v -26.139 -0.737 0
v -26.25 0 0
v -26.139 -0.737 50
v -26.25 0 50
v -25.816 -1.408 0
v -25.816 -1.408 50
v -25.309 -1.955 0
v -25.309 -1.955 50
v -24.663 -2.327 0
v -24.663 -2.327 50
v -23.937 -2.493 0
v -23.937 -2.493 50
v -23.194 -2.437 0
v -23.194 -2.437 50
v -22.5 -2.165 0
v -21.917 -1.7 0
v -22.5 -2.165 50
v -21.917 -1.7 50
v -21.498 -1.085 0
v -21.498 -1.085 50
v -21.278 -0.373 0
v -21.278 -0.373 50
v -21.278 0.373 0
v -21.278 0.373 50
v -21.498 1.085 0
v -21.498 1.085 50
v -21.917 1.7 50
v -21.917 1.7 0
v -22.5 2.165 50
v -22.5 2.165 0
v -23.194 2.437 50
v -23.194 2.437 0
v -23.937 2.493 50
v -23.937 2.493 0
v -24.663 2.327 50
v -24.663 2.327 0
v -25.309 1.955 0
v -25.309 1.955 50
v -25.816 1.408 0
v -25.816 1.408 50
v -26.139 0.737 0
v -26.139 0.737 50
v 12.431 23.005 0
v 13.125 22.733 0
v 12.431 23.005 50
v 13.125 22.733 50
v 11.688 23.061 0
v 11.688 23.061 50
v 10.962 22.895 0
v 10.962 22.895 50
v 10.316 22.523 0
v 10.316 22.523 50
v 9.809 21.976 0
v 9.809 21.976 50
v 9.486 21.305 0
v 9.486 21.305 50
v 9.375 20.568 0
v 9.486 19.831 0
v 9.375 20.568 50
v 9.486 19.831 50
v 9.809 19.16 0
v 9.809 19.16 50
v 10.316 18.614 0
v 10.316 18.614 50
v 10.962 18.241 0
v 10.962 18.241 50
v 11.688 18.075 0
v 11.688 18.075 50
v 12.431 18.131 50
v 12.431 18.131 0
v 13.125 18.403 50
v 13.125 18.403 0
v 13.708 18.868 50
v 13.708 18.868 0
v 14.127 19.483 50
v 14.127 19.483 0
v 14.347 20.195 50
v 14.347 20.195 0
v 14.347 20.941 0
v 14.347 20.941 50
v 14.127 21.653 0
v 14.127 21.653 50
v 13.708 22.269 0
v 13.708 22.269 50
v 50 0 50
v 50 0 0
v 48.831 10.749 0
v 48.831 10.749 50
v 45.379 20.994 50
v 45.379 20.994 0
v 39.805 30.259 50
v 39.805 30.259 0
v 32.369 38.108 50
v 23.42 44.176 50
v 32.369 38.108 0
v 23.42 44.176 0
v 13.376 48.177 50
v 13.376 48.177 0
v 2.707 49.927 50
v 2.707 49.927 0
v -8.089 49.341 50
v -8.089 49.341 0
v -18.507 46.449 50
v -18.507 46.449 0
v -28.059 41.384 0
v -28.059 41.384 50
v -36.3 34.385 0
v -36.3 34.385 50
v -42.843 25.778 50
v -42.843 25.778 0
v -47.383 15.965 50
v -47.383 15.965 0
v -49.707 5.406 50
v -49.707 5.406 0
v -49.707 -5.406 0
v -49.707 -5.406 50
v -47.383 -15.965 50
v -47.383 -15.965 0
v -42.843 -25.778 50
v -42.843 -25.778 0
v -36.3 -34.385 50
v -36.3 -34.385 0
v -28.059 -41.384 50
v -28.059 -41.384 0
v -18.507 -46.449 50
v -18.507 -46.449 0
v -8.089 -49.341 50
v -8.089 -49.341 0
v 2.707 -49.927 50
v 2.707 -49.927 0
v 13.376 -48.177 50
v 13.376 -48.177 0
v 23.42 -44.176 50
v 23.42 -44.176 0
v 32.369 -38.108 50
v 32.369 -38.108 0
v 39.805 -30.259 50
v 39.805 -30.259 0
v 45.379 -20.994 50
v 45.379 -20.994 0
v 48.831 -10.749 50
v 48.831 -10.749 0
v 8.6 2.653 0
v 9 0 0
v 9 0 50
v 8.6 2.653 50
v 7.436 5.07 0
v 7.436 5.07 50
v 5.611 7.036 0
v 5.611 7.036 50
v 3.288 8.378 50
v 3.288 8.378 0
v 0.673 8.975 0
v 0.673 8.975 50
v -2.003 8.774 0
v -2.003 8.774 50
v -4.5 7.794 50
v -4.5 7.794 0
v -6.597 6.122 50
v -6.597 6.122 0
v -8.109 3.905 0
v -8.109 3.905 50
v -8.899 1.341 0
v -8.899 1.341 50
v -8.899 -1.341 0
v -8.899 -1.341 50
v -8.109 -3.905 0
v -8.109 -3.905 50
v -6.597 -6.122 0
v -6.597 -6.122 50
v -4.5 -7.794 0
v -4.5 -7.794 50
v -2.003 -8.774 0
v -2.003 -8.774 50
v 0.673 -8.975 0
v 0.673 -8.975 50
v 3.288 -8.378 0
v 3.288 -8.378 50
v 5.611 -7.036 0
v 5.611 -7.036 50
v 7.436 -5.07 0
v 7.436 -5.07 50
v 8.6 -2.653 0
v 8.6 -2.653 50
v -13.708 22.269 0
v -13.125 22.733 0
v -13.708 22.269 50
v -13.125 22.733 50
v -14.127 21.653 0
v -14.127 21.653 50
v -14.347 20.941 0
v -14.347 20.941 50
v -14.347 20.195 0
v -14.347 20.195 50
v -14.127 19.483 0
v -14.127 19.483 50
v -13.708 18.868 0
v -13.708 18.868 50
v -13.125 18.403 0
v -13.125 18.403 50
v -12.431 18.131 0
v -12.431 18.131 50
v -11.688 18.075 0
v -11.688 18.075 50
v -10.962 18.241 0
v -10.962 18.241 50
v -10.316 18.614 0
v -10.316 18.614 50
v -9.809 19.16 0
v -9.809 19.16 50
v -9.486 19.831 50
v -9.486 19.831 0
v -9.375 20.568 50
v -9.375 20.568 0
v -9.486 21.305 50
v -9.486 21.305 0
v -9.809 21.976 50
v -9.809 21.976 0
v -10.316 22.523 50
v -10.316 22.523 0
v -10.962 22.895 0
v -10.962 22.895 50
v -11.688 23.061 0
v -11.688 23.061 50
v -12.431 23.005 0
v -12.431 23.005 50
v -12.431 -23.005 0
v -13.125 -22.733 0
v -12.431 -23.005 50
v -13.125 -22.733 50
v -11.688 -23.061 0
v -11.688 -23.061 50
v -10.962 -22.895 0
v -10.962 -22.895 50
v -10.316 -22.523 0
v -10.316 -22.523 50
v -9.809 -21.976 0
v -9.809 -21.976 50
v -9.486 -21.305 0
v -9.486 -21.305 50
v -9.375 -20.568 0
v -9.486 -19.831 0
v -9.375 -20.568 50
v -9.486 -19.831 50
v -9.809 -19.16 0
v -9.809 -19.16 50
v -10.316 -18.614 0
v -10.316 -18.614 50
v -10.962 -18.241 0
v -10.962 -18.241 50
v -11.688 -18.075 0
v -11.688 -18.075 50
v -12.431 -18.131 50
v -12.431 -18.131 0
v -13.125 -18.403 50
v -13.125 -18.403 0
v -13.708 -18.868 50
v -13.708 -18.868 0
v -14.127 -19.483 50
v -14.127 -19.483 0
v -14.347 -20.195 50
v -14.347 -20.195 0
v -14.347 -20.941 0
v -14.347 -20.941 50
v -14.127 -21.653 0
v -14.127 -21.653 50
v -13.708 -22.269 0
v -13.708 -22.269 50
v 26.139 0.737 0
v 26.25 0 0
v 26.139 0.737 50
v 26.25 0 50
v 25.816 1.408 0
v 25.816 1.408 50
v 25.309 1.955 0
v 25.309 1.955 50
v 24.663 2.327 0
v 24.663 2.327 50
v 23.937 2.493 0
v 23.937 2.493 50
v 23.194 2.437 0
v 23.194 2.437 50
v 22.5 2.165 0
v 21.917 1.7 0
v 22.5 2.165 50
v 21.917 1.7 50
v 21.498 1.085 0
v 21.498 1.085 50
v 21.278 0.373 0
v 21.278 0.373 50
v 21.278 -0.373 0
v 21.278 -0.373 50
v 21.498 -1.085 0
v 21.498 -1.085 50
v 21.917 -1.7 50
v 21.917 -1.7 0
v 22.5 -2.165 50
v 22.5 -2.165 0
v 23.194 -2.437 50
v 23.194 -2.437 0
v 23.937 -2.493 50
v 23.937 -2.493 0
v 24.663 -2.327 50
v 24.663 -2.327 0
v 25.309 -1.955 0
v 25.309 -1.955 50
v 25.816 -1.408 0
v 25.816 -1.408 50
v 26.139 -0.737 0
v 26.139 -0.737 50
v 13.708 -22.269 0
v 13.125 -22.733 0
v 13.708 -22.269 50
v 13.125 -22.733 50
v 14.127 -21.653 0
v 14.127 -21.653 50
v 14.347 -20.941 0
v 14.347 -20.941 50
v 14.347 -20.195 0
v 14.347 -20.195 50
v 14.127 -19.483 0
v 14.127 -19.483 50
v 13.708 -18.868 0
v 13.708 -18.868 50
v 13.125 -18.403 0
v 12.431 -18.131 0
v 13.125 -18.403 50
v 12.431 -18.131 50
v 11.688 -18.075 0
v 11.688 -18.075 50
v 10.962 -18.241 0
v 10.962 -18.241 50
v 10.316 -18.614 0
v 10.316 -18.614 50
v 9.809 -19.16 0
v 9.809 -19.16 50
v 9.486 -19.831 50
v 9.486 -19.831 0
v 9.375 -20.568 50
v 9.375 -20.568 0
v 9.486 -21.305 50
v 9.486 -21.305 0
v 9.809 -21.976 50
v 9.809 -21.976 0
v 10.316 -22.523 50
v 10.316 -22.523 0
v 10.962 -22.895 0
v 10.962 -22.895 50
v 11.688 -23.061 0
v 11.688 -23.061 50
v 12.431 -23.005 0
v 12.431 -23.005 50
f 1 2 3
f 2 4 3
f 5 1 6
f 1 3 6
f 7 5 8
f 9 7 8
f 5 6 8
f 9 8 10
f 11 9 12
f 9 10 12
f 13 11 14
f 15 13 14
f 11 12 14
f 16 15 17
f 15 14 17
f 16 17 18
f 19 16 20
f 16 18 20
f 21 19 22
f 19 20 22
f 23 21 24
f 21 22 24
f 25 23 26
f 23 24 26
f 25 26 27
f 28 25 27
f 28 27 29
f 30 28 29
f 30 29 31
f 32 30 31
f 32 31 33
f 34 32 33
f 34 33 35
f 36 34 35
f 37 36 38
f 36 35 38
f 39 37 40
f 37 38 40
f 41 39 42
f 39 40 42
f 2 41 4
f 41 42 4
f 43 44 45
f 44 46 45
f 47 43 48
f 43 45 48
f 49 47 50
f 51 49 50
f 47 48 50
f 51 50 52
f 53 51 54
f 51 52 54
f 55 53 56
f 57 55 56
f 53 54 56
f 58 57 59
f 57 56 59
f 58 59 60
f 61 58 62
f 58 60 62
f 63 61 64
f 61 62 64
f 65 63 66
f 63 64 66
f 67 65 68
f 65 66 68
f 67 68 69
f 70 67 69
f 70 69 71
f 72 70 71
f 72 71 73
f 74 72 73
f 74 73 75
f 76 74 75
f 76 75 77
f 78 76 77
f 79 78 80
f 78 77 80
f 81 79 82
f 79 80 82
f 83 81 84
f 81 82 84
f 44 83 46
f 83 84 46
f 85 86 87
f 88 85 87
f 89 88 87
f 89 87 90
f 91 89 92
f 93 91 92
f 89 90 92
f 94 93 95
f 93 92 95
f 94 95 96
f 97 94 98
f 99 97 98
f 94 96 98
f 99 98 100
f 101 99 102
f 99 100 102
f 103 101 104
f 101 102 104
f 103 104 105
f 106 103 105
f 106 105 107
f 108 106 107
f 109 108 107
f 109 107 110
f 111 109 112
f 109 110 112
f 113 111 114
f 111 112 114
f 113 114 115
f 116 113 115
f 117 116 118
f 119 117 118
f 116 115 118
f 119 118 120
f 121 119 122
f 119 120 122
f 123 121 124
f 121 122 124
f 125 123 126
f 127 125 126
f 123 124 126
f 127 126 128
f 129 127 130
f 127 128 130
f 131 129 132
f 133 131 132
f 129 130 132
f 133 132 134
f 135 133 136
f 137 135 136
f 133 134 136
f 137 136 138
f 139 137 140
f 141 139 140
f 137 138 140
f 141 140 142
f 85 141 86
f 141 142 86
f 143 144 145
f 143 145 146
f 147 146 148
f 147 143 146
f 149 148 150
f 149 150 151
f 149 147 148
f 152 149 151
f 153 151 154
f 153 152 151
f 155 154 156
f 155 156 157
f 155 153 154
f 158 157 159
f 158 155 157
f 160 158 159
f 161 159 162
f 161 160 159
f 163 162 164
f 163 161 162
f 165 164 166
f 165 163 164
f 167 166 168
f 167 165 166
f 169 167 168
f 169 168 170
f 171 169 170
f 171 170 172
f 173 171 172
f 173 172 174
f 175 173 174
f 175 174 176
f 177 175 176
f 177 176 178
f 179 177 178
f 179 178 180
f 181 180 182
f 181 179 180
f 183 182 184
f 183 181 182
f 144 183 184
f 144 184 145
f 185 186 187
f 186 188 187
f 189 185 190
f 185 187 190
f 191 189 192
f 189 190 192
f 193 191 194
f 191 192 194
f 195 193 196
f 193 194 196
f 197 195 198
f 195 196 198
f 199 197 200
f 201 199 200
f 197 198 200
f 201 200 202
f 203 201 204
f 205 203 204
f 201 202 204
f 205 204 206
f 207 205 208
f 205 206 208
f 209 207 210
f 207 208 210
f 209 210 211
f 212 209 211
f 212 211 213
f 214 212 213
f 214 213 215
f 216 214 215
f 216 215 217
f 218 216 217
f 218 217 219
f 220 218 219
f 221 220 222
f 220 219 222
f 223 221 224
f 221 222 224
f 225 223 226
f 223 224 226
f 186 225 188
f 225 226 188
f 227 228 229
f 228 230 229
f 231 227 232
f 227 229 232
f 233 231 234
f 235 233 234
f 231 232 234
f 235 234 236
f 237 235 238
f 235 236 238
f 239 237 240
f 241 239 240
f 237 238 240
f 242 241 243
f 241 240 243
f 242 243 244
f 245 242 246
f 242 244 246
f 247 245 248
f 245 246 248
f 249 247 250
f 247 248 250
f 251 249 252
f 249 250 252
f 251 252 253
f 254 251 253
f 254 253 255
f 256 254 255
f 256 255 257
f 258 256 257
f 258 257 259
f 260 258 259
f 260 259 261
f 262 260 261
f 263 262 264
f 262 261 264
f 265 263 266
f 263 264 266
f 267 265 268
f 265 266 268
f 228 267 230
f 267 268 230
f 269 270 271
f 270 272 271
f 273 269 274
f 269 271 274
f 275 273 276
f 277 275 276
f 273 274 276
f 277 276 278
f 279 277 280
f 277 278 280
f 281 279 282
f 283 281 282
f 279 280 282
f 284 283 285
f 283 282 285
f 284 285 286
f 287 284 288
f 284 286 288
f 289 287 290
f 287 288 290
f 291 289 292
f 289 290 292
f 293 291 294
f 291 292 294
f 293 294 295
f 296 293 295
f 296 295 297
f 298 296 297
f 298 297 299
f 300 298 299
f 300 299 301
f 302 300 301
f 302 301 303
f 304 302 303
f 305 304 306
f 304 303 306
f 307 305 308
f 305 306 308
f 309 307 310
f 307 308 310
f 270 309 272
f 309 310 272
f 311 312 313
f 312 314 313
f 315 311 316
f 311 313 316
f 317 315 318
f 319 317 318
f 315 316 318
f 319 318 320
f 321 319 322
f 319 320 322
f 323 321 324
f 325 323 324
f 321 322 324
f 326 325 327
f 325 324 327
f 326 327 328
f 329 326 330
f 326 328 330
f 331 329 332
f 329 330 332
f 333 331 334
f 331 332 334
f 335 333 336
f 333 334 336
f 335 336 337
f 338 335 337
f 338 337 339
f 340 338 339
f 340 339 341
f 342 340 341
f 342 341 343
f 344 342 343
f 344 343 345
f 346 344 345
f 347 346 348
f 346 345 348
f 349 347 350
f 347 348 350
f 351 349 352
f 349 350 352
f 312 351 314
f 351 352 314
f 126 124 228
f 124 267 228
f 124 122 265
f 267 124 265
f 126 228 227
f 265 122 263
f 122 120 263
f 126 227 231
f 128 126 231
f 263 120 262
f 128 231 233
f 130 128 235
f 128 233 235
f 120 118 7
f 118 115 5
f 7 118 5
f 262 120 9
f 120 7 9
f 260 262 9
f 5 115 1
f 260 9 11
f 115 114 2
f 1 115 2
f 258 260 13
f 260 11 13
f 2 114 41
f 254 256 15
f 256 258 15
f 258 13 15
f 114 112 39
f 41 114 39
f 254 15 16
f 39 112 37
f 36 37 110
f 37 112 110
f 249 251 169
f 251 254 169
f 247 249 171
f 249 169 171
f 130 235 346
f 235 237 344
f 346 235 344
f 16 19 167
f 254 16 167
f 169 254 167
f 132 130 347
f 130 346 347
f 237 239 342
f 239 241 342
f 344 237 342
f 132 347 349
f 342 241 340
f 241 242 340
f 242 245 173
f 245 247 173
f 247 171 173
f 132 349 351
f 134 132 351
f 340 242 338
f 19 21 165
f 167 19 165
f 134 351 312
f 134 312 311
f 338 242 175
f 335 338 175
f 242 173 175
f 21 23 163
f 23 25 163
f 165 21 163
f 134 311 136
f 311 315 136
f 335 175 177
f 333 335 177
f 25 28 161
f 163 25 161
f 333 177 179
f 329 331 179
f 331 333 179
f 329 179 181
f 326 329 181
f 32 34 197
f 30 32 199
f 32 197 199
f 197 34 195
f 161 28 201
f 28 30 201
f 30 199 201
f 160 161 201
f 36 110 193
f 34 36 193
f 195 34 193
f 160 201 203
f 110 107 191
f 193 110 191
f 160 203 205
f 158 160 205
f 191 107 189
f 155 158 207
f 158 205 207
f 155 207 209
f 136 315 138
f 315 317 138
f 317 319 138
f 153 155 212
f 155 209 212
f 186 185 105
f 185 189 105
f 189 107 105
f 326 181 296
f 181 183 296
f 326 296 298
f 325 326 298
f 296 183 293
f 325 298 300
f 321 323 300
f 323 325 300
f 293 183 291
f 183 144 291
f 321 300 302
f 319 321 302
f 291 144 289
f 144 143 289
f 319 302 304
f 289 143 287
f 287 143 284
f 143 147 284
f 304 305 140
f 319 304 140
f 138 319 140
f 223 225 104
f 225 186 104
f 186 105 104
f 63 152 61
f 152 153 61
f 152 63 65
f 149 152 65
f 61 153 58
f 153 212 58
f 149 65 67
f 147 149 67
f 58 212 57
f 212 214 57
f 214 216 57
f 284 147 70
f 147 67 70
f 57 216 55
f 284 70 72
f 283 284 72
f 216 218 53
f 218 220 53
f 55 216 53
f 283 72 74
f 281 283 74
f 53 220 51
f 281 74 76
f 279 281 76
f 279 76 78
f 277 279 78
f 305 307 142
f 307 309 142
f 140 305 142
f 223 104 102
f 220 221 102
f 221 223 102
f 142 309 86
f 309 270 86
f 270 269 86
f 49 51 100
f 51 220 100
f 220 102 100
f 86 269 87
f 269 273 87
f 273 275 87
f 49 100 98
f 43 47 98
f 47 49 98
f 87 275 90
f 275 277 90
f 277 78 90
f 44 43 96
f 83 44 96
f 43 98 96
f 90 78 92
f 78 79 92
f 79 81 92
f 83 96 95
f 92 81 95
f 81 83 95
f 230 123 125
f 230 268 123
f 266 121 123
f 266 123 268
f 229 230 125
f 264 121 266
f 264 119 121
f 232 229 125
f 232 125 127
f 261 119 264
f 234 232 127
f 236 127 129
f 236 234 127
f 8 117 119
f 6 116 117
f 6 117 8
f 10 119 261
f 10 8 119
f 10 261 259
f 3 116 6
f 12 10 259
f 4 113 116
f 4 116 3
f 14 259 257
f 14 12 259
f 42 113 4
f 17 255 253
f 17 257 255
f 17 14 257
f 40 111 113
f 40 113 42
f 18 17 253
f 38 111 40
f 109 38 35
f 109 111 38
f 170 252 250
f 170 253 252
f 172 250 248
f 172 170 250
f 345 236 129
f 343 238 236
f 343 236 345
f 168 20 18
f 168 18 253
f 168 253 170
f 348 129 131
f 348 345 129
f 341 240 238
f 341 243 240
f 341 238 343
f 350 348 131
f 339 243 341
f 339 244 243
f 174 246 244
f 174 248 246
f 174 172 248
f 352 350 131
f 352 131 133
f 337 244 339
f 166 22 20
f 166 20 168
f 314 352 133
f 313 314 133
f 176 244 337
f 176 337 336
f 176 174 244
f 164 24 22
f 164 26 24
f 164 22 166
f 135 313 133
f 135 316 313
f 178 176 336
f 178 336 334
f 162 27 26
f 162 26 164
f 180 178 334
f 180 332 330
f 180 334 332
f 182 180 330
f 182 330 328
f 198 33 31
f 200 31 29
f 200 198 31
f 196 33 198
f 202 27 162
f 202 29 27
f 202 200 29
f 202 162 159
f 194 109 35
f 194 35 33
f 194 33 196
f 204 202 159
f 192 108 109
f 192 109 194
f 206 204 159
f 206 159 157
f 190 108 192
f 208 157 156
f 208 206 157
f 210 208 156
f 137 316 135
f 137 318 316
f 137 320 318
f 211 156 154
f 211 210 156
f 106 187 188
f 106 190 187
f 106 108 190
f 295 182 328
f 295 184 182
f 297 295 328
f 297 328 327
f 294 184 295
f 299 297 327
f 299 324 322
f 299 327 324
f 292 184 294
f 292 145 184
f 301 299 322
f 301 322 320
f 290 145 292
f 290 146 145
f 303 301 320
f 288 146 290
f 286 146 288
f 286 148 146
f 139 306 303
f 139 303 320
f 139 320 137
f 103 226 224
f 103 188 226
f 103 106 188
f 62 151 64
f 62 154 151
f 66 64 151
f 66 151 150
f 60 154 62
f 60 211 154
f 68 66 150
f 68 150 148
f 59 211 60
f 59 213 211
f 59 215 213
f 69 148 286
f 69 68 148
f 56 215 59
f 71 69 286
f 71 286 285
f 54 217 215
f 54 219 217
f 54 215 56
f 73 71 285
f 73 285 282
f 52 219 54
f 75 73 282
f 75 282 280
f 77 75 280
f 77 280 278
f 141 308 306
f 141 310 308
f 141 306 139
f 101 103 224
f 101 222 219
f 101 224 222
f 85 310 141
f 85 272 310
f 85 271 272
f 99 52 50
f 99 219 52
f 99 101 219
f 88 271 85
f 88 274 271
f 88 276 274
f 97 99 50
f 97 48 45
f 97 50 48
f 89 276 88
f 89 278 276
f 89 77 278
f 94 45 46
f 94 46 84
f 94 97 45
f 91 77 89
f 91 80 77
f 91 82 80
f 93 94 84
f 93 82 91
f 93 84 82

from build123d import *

# Parameters (mm, degrees)
SKETCH_1_R               = 50
SKETCH_1_R_2             = 9
EXTRUDE_1_DEPTH          = 50
SKETCH_2_R               = 2.5
CUT_EXTRUDE_1_DEPTH      = 87.602540378
PATTERN_CIRCULAR_1_COUNT = 6


with BuildPart() as part:
    # Эскиз1 → Бобышка-Вытянуть1 (new body)
    with BuildSketch(Plane.XY):
        Circle(SKETCH_1_R)
        Circle(SKETCH_1_R_2, mode=Mode.SUBTRACT)
    extrude(amount=EXTRUDE_1_DEPTH)

    # Эскиз2 → Вырез-Вытянуть1 (cut, symmetric)
    with BuildSketch(Plane.XY.offset(50)):
        with Locations((23.75, 0)):
            Circle(SKETCH_2_R)
    cut_extrude_1 = extrude(amount=CUT_EXTRUDE_1_DEPTH, both=True, mode=Mode.SUBTRACT)

    # Круговой массив1: Вырез-Вытянуть1 ×6 about axis
    pattern_circular_1_axis = Axis((0, 0, 0), (0, 0, 1))
    for i in range(1, PATTERN_CIRCULAR_1_COUNT):
        add(cut_extrude_1.rotate(pattern_circular_1_axis, i * 360 / PATTERN_CIRCULAR_1_COUNT), mode=Mode.SUBTRACT)


solid = part.part
